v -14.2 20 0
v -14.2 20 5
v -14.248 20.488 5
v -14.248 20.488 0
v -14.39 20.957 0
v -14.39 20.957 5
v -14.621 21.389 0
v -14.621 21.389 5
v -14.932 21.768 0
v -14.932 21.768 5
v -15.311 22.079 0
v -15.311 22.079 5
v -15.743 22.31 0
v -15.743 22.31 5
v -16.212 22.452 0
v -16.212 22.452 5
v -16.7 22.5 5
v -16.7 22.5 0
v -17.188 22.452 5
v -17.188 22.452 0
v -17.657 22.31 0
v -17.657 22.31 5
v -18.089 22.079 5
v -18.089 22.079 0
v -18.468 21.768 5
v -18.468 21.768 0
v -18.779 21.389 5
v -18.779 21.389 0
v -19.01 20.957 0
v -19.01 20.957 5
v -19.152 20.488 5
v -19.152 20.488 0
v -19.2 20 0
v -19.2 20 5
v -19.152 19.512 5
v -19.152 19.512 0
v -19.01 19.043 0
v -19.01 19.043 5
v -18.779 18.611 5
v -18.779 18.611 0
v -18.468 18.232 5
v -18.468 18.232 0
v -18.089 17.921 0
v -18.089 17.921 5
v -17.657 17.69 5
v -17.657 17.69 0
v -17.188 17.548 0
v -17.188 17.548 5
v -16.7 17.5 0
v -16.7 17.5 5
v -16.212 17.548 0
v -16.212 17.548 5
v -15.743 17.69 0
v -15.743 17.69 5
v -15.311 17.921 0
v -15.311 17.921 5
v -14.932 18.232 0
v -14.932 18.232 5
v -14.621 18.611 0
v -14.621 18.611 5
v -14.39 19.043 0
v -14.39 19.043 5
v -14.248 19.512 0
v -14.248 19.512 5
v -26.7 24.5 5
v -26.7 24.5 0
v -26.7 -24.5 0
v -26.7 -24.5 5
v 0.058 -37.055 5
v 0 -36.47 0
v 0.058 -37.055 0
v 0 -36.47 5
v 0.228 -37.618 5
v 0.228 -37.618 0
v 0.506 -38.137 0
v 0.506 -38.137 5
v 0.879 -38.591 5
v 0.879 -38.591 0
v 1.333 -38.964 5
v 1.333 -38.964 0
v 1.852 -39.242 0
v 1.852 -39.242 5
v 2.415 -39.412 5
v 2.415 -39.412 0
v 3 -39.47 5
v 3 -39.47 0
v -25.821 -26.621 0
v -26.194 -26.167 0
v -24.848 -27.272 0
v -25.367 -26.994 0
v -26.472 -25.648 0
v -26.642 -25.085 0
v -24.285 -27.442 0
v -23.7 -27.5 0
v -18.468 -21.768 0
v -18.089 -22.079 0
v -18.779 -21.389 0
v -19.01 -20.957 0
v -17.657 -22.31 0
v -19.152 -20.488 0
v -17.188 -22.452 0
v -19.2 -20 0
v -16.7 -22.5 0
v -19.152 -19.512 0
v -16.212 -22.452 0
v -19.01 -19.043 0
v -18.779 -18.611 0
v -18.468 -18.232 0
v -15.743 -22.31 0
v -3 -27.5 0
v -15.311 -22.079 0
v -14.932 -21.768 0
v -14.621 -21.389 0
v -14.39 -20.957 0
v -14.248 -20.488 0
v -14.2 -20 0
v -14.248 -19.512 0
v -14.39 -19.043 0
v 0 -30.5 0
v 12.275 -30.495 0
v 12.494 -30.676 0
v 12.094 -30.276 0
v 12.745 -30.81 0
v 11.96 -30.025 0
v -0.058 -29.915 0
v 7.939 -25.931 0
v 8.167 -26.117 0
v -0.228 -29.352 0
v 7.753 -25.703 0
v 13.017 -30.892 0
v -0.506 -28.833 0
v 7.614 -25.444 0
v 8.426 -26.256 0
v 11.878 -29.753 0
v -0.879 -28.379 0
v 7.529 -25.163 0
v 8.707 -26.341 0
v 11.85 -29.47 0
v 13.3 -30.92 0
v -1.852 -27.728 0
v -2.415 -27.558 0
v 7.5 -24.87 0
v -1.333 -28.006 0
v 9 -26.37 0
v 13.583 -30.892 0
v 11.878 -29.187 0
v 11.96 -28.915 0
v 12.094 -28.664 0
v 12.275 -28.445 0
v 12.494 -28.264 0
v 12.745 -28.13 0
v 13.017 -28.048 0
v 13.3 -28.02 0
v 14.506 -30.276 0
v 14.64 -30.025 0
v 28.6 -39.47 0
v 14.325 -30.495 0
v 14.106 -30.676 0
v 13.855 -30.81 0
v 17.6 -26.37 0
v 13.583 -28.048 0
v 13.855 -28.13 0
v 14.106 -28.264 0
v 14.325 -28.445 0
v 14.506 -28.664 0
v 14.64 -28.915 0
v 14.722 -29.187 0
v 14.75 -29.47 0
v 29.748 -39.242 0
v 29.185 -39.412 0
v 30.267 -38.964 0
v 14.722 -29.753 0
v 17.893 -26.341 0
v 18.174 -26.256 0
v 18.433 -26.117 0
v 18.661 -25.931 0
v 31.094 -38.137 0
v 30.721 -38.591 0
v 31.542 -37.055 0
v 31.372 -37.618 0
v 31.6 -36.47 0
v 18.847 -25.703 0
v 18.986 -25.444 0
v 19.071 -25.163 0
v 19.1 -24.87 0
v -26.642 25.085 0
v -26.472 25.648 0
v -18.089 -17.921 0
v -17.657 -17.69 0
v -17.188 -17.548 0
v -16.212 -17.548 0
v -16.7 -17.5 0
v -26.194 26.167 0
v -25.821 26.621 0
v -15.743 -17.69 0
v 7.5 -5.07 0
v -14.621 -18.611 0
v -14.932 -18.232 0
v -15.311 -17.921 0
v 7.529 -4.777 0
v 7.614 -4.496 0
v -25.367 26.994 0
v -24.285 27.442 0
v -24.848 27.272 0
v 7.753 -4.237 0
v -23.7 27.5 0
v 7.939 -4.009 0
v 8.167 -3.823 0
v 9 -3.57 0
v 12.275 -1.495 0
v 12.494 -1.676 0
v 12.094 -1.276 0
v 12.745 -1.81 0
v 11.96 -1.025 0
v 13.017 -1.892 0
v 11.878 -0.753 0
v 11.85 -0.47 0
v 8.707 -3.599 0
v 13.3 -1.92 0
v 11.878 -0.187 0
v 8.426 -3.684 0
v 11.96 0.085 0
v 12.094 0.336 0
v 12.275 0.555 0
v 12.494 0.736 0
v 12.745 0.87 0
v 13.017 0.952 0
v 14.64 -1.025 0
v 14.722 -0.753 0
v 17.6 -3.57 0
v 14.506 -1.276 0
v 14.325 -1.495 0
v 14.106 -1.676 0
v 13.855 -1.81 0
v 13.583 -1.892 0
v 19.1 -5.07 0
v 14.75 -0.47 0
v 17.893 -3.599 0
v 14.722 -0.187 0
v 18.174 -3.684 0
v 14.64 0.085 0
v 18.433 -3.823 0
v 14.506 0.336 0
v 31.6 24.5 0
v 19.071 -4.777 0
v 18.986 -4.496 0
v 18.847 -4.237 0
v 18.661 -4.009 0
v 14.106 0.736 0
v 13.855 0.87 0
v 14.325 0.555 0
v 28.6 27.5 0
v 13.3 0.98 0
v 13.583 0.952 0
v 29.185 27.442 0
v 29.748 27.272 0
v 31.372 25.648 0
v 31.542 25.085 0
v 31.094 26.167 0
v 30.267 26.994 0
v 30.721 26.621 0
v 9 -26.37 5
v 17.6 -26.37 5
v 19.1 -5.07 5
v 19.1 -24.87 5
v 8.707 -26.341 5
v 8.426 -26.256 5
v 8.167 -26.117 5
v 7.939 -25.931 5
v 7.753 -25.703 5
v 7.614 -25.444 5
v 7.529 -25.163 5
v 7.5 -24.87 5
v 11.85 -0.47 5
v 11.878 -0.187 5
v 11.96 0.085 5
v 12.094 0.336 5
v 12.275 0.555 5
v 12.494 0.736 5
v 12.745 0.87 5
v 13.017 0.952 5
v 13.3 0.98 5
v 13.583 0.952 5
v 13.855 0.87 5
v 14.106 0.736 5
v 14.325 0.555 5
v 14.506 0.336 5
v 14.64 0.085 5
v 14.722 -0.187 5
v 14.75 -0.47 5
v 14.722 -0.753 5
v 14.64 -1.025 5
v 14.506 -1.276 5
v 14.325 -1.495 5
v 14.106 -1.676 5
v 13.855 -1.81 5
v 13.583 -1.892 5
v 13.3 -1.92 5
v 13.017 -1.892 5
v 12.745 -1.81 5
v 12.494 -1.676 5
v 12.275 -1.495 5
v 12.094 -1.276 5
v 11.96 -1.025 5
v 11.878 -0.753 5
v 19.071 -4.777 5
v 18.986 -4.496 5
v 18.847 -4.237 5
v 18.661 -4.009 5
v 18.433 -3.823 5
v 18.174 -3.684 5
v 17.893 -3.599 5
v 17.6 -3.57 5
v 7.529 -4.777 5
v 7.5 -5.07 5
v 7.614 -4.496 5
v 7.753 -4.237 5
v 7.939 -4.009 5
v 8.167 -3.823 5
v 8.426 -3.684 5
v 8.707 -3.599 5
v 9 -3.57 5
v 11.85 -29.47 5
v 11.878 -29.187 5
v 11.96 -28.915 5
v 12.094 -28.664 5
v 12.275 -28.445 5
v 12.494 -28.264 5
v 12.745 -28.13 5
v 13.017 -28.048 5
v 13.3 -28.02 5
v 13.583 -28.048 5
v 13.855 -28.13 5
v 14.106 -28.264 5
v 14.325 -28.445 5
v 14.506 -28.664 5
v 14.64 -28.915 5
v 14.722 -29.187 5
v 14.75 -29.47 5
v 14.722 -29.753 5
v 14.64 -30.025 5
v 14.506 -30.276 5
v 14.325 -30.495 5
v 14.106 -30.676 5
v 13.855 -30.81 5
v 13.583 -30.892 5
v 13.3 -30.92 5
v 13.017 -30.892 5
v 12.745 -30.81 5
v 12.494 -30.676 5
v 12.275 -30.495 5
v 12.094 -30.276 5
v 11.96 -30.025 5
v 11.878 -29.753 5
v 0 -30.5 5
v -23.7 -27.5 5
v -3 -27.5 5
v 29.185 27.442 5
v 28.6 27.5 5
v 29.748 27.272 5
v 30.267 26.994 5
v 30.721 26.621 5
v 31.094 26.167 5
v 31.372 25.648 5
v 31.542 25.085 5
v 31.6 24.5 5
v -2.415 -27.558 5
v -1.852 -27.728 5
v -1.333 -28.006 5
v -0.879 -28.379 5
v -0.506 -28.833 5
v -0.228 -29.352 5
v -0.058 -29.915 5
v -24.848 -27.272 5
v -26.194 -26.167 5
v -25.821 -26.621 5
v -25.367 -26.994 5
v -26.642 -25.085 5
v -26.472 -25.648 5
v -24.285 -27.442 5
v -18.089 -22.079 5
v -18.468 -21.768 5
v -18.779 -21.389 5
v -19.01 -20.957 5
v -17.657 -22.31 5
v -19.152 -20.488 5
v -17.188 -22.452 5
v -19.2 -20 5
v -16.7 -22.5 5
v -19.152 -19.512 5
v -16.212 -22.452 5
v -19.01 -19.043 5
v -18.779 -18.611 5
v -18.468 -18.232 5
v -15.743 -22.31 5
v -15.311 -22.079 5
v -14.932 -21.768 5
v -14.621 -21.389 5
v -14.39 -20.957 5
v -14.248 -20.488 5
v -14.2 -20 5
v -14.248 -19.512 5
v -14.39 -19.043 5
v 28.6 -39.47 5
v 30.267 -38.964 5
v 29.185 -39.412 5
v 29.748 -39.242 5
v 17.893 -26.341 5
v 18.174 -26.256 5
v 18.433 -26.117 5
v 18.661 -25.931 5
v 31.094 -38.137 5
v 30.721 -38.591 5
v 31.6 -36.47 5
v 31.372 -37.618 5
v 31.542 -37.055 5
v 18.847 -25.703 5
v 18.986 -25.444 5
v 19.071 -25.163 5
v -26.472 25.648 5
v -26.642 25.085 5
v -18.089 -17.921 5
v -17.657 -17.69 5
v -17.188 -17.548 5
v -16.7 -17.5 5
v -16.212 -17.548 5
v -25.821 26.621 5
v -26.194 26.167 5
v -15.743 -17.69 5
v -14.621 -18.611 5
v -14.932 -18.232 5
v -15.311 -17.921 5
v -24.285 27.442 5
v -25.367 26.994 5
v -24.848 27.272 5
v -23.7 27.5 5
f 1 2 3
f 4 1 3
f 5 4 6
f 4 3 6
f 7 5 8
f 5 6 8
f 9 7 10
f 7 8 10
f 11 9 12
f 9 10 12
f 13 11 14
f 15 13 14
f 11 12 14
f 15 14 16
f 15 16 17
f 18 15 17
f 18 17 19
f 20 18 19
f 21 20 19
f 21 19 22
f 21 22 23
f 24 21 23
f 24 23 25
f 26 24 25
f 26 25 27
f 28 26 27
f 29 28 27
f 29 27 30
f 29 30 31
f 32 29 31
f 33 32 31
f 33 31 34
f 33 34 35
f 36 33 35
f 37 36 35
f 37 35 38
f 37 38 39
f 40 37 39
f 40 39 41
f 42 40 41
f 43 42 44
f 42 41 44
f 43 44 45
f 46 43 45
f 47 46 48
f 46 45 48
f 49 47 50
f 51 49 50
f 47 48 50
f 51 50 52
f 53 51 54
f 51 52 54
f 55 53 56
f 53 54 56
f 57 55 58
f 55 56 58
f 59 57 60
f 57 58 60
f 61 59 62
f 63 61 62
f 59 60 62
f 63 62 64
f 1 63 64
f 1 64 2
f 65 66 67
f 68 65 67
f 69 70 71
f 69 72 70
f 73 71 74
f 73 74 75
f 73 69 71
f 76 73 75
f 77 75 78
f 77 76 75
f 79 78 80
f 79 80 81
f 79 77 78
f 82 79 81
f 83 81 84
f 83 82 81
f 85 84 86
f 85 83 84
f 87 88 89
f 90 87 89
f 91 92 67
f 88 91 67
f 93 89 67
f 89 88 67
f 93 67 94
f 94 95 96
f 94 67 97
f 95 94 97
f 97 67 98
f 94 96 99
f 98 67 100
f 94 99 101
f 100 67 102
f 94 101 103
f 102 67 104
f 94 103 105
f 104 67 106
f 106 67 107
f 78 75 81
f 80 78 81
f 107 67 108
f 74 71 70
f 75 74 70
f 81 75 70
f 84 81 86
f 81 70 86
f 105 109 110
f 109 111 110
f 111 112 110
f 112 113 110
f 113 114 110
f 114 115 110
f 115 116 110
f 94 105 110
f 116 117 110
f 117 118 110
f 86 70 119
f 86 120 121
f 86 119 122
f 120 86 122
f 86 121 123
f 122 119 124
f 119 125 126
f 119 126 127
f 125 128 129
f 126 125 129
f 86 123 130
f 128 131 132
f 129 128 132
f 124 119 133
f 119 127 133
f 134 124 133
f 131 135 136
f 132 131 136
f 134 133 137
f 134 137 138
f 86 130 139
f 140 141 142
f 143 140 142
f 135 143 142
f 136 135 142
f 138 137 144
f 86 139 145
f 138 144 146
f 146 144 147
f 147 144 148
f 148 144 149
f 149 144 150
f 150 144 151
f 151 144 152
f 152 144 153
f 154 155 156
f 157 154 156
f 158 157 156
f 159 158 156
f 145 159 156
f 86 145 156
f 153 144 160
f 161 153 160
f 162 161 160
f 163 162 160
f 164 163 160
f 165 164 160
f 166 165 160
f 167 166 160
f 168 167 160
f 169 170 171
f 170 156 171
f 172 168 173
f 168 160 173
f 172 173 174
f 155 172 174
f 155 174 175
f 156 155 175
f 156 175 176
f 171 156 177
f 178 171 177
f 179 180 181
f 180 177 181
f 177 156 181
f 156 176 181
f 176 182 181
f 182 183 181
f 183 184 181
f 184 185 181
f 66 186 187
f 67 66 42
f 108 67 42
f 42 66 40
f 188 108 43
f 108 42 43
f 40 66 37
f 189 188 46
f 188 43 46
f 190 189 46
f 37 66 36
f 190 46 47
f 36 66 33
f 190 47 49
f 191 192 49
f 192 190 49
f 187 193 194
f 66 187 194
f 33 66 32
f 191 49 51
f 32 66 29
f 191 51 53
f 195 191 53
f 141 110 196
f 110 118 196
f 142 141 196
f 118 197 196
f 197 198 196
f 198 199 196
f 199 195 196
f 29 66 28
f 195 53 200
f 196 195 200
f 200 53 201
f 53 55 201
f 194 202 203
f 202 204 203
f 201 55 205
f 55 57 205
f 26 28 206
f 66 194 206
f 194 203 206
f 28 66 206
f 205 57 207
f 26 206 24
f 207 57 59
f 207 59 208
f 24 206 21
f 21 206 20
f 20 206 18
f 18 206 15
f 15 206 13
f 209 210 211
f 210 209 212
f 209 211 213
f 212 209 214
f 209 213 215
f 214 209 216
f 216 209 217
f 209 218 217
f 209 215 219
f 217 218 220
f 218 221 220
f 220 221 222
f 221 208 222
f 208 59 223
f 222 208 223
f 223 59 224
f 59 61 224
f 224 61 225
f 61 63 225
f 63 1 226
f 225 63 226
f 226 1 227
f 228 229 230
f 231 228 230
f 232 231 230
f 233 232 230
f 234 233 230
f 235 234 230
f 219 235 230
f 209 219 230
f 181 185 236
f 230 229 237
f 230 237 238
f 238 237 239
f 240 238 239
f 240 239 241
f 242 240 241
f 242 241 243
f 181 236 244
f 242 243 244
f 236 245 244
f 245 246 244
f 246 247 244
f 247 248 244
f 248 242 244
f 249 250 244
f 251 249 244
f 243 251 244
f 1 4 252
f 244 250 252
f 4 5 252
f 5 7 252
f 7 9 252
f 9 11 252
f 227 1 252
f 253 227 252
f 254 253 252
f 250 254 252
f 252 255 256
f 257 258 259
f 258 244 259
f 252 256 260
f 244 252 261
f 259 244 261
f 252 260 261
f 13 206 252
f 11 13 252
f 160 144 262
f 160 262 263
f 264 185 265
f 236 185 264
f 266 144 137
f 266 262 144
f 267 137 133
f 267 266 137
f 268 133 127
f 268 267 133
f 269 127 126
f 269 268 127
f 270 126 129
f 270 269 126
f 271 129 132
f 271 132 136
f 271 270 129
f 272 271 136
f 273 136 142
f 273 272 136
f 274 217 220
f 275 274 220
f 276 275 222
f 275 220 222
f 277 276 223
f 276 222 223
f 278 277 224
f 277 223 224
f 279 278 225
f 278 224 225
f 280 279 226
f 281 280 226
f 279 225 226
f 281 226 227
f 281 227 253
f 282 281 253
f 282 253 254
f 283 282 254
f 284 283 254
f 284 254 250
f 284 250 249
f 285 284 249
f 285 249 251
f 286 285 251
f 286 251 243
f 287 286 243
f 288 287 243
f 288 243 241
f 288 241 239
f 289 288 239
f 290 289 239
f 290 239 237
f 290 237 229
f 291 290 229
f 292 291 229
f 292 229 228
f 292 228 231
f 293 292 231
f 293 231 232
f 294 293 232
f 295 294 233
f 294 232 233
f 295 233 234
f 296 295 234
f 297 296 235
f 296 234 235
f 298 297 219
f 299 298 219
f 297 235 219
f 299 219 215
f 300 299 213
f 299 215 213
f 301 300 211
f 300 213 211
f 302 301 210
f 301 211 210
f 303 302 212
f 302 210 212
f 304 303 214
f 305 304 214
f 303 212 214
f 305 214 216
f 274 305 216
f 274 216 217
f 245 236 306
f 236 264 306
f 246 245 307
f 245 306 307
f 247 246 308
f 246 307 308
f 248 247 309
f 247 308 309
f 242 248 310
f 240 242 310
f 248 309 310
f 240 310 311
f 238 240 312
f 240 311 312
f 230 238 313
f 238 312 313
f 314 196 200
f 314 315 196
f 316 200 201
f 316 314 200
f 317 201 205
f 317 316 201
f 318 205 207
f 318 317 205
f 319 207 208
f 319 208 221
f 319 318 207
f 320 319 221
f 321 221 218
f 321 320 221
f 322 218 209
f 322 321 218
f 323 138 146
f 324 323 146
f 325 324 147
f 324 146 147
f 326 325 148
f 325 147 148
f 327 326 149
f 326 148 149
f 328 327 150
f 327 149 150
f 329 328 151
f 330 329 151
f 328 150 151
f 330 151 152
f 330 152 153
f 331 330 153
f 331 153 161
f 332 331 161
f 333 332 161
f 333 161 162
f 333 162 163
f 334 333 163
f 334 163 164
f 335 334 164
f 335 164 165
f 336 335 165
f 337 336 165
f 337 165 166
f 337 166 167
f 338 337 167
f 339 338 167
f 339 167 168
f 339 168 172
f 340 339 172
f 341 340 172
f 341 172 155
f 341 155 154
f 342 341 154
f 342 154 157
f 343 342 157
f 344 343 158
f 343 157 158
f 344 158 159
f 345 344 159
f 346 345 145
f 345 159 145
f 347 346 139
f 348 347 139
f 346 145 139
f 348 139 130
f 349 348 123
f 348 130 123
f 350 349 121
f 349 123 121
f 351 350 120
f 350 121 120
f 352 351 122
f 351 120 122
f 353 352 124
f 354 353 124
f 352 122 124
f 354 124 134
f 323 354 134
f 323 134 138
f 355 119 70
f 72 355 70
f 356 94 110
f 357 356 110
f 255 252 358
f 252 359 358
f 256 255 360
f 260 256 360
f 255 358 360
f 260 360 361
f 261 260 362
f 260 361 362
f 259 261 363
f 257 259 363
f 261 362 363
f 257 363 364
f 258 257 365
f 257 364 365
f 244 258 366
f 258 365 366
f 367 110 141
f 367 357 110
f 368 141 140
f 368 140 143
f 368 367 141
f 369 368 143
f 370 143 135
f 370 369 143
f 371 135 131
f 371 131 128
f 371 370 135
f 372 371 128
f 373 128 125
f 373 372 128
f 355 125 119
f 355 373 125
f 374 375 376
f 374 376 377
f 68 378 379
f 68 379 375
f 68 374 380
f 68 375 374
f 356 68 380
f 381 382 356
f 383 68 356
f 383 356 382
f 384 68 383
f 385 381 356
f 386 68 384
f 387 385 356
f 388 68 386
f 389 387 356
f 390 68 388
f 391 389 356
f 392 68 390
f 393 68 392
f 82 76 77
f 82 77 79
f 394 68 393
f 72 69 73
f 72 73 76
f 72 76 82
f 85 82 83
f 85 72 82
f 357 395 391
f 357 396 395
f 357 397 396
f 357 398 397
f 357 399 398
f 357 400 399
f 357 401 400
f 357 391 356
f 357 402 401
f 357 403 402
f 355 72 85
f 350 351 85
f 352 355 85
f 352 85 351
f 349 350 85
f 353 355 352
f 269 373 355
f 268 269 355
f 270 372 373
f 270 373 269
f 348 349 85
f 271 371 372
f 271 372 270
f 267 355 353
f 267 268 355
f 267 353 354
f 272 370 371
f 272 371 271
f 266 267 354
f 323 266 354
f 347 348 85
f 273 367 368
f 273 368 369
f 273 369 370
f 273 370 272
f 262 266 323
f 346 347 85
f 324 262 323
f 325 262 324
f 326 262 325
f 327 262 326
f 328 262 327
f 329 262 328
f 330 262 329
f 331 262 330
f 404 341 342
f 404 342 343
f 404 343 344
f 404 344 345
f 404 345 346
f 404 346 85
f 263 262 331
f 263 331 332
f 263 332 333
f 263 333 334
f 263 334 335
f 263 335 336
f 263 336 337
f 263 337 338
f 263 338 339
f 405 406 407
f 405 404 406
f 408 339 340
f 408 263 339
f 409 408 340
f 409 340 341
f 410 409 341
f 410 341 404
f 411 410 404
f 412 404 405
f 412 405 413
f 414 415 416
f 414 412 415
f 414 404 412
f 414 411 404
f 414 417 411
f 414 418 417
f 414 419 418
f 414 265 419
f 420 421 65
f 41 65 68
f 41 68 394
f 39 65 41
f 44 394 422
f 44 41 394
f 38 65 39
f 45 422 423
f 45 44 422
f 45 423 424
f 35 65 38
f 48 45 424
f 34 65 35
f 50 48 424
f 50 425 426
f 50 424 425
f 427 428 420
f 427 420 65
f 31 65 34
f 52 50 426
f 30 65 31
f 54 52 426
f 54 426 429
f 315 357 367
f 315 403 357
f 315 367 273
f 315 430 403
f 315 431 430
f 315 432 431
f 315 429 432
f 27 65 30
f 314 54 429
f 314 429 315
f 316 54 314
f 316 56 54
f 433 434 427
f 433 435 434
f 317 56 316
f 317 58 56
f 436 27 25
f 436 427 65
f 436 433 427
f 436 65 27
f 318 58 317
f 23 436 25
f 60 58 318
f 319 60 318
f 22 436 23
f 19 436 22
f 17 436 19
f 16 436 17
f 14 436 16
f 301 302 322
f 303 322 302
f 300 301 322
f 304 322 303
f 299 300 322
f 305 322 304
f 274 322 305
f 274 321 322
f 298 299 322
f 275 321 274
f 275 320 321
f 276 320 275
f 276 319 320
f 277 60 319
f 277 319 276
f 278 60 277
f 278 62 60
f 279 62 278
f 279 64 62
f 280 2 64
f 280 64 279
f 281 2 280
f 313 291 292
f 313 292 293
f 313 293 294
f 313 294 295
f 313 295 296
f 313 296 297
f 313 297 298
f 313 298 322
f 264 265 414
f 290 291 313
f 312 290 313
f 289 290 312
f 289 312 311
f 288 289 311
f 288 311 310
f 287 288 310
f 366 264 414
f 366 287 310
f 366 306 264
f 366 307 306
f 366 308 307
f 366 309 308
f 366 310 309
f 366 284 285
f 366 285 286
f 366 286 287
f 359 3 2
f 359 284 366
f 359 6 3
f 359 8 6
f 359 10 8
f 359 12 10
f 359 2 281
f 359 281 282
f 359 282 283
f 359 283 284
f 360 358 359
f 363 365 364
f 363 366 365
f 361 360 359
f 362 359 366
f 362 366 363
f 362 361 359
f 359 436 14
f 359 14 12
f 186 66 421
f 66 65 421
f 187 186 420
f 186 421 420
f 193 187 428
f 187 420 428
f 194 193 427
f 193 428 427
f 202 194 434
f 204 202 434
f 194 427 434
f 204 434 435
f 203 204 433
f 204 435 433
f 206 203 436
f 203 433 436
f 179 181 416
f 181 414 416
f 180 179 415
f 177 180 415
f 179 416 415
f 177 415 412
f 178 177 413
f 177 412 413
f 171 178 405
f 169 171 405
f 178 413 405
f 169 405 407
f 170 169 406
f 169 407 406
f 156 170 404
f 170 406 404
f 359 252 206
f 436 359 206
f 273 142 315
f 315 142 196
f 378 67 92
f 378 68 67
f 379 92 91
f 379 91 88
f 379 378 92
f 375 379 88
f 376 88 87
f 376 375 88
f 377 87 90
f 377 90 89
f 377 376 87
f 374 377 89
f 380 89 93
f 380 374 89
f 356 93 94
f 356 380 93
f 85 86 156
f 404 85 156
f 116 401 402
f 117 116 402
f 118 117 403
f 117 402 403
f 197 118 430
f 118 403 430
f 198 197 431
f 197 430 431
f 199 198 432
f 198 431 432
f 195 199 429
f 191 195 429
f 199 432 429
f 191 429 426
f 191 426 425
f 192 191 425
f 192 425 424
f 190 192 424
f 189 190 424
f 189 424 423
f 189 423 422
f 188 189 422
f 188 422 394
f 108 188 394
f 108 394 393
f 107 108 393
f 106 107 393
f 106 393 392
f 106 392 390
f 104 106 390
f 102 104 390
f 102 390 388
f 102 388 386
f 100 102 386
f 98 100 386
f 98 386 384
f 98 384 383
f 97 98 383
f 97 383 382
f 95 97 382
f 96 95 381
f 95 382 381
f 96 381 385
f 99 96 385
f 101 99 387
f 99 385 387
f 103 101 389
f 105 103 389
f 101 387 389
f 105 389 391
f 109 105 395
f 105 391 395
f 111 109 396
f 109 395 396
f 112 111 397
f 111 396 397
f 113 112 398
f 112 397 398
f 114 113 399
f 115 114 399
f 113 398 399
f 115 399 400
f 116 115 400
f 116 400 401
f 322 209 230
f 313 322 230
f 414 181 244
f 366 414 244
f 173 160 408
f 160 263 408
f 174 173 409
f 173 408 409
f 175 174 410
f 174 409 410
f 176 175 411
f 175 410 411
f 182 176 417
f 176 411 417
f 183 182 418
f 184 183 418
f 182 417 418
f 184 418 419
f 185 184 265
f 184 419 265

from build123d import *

# Parameters (mm, degrees)
BASE_W                 = 11.6
BASE_H                 = 22.8
MAIN_DEPTH             = 5
GEAR_AXIS_HOLES_D      = 5
M2_5_CLEARANCE_HOLE1_D = 2.9
FILLET1_R              = 3
FILLET2_R              = 1.5


with BuildPart() as part:
    # Base → Main (new body)
    with BuildSketch(Plane.XY):
        Polygon((0, 27.5), (-26.7, 27.5), (-26.7, -27.5), (0, -27.5), (0, -39.47), (26.6, -39.47), (31.6, -39.47), (31.6, 27.5), (26.6, 27.5), align=None)
        with Locations((13.3, -14.97)):
            Rectangle(BASE_W, BASE_H, mode=Mode.SUBTRACT)
    extrude(amount=MAIN_DEPTH)

    # Gear Axis Holes (through all)
    with Locations(Plane(origin=(0, 0, 0), x_dir=(-1, 0, 0), z_dir=(0, 0, -1))):
        with Locations((16.7, -20), (16.7, 20)):
            Hole(GEAR_AXIS_HOLES_D / 2)

    # M2.5 Clearance Hole1 (through all)
    with Locations(Plane.XY.offset(5)):
        with Locations((13.3, -0.47), (13.3, -29.47)):
            Hole(M2_5_CLEARANCE_HOLE1_D / 2)

    # Fillet1
    fillet1_edges = [part.edges().sort_by_distance(p)[0] for p in [
        (31.6, 27.5, 2.5),
        (31.6, -39.47, 2.5),
        (0, -39.47, 2.5),
        (0, -27.5, 2.5),
        (-26.7, -27.5, 2.5),
        (-26.7, 27.5, 2.5),
    ]]
    fillet(fillet1_edges, radius=FILLET1_R)

    # Fillet2
    fillet2_edges = [part.edges().sort_by_distance(p)[0] for p in [
        (19.1, -26.37, 2.5),
        (19.1, -3.57, 2.5),
        (7.5, -3.57, 2.5),
        (7.5, -26.37, 2.5),
    ]]
    fillet(fillet2_edges, radius=FILLET2_R)


solid = part.part
